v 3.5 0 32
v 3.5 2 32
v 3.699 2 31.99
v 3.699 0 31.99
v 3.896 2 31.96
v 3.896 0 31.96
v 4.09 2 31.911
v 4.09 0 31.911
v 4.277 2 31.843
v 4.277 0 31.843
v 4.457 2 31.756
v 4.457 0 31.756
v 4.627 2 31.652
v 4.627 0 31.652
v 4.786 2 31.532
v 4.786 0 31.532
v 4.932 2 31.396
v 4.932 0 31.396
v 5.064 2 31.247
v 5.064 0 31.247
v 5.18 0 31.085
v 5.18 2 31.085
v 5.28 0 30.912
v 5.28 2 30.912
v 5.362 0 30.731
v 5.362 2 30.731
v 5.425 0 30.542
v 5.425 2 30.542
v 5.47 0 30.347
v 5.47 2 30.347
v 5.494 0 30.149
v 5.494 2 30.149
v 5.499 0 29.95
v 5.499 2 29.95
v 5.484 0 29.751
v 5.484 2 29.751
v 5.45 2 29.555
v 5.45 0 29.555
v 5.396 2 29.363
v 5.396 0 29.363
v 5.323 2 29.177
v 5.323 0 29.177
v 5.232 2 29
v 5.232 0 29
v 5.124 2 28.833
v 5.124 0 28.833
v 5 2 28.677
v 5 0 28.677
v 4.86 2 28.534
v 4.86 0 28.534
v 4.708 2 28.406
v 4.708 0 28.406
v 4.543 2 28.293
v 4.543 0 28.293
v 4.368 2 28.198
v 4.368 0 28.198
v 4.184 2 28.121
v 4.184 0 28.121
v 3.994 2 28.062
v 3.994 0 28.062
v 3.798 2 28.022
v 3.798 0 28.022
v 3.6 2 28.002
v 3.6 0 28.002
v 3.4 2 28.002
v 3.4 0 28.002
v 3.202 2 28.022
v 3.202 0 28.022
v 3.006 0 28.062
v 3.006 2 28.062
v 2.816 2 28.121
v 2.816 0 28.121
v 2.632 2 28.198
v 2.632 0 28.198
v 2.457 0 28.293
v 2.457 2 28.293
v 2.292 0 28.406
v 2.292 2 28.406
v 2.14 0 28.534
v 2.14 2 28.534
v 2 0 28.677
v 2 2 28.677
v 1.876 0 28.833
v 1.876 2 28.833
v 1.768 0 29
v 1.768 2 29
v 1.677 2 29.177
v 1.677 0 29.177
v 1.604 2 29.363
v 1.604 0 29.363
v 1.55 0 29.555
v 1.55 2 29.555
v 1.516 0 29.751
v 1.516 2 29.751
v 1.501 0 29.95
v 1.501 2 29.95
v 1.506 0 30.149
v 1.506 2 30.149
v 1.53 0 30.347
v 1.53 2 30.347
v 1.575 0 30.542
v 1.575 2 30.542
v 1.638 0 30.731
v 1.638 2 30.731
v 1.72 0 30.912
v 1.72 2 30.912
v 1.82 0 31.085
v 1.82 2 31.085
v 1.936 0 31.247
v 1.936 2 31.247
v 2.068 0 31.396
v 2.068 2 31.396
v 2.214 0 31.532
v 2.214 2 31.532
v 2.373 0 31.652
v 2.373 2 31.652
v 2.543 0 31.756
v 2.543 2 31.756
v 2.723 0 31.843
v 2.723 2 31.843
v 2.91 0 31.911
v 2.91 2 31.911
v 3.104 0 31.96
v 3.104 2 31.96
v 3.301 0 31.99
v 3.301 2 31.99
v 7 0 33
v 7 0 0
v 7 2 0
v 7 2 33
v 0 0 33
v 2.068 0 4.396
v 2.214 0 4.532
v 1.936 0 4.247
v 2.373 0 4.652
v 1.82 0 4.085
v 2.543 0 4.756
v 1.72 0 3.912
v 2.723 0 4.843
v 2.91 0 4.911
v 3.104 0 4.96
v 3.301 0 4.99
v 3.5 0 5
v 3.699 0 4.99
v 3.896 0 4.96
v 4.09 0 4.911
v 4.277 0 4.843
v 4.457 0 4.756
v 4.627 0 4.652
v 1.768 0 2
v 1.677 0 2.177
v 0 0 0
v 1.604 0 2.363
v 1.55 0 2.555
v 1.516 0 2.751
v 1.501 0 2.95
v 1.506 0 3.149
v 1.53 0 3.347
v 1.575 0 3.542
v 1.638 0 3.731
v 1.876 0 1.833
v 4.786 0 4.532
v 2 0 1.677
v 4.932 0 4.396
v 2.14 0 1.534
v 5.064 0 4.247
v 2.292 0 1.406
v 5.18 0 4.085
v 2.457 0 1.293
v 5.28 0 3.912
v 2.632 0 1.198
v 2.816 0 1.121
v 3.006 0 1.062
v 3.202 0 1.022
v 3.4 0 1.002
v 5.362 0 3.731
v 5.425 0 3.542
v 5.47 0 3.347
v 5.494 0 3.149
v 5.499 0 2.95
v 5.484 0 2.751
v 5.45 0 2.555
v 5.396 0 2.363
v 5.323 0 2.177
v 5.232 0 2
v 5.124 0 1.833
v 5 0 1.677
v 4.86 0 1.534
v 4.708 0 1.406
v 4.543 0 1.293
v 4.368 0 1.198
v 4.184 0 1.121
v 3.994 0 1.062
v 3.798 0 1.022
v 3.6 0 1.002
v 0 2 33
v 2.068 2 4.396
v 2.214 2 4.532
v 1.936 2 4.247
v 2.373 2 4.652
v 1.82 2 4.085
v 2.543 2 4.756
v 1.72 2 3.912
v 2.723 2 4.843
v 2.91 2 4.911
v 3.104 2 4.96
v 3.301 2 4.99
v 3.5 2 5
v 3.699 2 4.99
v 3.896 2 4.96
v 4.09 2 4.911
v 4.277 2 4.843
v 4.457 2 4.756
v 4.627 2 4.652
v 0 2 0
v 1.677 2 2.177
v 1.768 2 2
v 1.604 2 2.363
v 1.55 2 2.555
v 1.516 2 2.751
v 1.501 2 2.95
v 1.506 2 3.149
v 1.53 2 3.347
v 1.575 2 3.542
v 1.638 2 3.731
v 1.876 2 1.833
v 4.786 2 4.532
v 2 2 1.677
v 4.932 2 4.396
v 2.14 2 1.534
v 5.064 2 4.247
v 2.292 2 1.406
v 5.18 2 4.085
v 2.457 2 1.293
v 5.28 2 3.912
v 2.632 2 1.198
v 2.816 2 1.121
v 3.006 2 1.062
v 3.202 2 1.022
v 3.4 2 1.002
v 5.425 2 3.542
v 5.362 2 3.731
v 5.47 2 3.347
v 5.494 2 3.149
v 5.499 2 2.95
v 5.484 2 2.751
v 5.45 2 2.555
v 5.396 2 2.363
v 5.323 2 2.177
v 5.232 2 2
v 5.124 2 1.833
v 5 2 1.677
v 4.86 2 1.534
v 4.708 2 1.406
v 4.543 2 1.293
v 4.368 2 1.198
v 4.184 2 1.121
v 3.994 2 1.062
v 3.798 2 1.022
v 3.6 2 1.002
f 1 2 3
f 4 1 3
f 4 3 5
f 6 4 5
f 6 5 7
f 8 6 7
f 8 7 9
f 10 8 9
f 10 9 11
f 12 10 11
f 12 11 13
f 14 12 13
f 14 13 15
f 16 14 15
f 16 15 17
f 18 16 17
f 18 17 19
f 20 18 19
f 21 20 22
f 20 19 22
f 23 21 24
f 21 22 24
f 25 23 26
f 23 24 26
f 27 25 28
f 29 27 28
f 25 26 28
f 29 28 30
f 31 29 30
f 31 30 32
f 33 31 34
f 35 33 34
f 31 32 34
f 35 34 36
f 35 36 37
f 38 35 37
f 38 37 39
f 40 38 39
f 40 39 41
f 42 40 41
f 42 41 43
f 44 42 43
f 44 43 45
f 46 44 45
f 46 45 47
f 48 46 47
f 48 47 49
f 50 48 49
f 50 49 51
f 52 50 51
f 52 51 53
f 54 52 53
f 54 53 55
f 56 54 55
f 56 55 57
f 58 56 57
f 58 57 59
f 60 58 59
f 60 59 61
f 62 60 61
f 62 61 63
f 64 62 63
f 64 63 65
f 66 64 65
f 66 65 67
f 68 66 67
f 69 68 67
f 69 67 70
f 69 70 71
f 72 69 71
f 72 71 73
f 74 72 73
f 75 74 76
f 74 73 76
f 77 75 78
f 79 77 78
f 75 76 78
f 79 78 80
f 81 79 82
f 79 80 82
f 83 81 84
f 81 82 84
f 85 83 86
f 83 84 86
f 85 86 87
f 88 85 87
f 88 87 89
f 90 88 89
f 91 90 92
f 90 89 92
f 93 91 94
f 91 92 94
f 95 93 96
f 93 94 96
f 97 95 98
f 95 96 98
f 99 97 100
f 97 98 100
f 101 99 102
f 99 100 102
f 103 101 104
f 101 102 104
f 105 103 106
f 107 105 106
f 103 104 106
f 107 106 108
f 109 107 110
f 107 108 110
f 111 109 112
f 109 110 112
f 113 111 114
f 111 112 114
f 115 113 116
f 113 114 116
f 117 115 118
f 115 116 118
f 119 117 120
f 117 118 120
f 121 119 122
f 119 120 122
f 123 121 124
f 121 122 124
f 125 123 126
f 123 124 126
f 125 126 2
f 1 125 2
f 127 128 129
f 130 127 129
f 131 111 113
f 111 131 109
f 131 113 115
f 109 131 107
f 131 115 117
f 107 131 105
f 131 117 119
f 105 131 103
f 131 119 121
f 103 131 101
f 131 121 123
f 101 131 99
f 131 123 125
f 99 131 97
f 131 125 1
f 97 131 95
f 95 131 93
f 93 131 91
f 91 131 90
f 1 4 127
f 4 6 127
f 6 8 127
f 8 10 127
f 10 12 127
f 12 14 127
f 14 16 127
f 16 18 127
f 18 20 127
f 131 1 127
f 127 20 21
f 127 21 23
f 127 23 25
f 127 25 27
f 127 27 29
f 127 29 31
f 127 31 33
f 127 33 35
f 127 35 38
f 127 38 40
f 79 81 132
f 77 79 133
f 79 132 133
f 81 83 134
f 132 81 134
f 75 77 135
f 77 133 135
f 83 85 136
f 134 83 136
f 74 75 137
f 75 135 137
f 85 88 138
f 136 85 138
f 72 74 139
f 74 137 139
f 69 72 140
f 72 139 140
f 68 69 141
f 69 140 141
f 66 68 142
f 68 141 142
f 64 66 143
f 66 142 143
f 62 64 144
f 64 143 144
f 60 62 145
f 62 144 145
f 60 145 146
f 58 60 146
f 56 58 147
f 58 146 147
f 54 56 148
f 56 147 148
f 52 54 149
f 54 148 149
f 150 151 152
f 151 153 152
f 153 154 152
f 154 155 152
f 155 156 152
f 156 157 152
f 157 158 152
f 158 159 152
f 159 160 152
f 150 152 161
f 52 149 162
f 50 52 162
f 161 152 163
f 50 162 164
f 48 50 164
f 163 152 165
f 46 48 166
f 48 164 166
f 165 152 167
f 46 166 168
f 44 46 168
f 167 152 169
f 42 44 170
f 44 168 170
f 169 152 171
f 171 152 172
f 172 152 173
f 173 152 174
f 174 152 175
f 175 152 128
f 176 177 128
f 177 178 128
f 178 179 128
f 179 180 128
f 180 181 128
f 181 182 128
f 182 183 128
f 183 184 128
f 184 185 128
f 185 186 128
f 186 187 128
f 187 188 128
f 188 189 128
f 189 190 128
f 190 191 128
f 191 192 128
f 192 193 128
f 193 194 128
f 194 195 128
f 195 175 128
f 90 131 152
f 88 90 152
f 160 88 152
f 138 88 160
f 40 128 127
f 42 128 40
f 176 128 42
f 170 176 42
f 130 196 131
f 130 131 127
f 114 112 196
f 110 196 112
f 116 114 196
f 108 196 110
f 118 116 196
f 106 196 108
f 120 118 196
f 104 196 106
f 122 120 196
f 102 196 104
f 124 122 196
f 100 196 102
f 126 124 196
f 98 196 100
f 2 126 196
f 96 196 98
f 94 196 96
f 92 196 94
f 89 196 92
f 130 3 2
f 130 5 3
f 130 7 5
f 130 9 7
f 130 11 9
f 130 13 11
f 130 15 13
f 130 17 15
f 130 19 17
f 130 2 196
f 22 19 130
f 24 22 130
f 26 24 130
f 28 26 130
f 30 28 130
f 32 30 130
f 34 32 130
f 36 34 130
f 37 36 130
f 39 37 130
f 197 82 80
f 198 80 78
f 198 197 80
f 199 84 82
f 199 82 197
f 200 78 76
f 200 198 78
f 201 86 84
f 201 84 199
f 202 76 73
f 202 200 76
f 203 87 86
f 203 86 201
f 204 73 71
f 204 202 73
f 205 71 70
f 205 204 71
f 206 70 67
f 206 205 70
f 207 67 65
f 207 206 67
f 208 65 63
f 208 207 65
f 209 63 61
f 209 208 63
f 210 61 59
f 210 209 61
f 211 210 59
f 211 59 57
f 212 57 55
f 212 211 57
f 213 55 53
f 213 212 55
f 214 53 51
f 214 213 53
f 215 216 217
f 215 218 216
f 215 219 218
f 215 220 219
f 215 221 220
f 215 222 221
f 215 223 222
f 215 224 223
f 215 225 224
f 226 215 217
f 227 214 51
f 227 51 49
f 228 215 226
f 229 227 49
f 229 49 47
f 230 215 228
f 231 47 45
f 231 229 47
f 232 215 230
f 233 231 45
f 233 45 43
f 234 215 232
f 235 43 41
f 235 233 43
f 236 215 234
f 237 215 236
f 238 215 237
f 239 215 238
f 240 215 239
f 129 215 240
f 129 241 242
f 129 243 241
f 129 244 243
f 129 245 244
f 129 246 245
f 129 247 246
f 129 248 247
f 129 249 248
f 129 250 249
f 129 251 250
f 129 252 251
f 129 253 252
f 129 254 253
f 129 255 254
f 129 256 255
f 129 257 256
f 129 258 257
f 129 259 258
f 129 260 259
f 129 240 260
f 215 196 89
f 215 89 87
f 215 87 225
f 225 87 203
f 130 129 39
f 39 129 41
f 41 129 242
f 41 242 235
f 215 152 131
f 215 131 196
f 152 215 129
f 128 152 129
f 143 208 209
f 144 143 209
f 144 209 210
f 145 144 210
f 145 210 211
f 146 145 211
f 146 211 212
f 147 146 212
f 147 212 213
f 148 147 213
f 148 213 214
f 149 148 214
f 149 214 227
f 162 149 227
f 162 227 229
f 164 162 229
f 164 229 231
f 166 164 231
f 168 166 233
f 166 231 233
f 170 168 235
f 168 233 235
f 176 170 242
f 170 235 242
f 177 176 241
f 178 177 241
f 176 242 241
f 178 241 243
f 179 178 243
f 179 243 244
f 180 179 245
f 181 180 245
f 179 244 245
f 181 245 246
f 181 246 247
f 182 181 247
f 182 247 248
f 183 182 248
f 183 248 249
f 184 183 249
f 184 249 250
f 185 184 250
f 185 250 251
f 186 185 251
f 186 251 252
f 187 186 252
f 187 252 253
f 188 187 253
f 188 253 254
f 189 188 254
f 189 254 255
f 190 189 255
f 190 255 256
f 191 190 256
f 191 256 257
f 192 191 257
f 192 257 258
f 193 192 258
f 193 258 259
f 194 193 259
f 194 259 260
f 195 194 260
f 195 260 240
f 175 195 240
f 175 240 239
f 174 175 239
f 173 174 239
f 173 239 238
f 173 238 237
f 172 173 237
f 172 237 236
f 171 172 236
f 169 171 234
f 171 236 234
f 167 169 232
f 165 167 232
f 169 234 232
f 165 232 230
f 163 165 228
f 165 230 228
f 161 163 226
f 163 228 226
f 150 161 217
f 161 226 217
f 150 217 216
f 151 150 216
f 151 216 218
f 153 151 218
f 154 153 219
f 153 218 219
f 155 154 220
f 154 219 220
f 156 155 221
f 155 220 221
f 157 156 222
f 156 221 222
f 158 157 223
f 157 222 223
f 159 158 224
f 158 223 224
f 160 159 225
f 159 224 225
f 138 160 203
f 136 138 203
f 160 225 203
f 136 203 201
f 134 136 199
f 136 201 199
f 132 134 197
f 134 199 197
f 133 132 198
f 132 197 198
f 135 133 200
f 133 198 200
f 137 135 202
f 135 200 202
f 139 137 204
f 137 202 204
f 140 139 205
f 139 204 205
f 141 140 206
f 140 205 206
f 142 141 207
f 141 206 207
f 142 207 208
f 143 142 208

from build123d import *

# Parameters (mm, degrees)
SKETCH1_W           = 7
SKETCH1_H           = 2
BOSS_EXTRUDE1_DEPTH = 33
CUT_EXTRUDE1_REACH  = 35.793
SKETCH2_R           = 2


with BuildPart() as part:
    # Sketch1 → Boss-Extrude1 (new body)
    with BuildSketch(Plane.XY):
        with Locations((3.5, 1)):
            Rectangle(SKETCH1_W, SKETCH1_H)
    extrude(amount=BOSS_EXTRUDE1_DEPTH)

    # Sketch2 → Cut-Extrude1 (cut, up to next)
    with BuildSketch(Plane(origin=(0, 2, 0), x_dir=(1, 0, 0), z_dir=(0, 1, 0)), mode=Mode.PRIVATE) as cut_extrude1_sk1:
        with Locations(Location((3.5, -30, 0), (0, 0, 270))):
            Circle(SKETCH2_R)
    cut_extrude1_tool1 = extrude(cut_extrude1_sk1.sketch, amount=-CUT_EXTRUDE1_REACH, mode=Mode.PRIVATE) & part.part
    # Sketch2 → Cut-Extrude1 (cut, up to next)
    with BuildSketch(Plane(origin=(0, 2, 0), x_dir=(1, 0, 0), z_dir=(0, 1, 0)), mode=Mode.PRIVATE) as cut_extrude1_sk2:
        with Locations(Location((3.5, -3, 0), (0, 0, 270))):
            Circle(SKETCH2_R)
    cut_extrude1_tool2 = extrude(cut_extrude1_sk2.sketch, amount=-CUT_EXTRUDE1_REACH, mode=Mode.PRIVATE) & part.part
    add(cut_extrude1_tool1.solids().sort_by_distance((3.5, 2, 30))[0], mode=Mode.SUBTRACT)
    add(cut_extrude1_tool2.solids().sort_by_distance((3.5, 2, 3))[0], mode=Mode.SUBTRACT)


solid = part.part
